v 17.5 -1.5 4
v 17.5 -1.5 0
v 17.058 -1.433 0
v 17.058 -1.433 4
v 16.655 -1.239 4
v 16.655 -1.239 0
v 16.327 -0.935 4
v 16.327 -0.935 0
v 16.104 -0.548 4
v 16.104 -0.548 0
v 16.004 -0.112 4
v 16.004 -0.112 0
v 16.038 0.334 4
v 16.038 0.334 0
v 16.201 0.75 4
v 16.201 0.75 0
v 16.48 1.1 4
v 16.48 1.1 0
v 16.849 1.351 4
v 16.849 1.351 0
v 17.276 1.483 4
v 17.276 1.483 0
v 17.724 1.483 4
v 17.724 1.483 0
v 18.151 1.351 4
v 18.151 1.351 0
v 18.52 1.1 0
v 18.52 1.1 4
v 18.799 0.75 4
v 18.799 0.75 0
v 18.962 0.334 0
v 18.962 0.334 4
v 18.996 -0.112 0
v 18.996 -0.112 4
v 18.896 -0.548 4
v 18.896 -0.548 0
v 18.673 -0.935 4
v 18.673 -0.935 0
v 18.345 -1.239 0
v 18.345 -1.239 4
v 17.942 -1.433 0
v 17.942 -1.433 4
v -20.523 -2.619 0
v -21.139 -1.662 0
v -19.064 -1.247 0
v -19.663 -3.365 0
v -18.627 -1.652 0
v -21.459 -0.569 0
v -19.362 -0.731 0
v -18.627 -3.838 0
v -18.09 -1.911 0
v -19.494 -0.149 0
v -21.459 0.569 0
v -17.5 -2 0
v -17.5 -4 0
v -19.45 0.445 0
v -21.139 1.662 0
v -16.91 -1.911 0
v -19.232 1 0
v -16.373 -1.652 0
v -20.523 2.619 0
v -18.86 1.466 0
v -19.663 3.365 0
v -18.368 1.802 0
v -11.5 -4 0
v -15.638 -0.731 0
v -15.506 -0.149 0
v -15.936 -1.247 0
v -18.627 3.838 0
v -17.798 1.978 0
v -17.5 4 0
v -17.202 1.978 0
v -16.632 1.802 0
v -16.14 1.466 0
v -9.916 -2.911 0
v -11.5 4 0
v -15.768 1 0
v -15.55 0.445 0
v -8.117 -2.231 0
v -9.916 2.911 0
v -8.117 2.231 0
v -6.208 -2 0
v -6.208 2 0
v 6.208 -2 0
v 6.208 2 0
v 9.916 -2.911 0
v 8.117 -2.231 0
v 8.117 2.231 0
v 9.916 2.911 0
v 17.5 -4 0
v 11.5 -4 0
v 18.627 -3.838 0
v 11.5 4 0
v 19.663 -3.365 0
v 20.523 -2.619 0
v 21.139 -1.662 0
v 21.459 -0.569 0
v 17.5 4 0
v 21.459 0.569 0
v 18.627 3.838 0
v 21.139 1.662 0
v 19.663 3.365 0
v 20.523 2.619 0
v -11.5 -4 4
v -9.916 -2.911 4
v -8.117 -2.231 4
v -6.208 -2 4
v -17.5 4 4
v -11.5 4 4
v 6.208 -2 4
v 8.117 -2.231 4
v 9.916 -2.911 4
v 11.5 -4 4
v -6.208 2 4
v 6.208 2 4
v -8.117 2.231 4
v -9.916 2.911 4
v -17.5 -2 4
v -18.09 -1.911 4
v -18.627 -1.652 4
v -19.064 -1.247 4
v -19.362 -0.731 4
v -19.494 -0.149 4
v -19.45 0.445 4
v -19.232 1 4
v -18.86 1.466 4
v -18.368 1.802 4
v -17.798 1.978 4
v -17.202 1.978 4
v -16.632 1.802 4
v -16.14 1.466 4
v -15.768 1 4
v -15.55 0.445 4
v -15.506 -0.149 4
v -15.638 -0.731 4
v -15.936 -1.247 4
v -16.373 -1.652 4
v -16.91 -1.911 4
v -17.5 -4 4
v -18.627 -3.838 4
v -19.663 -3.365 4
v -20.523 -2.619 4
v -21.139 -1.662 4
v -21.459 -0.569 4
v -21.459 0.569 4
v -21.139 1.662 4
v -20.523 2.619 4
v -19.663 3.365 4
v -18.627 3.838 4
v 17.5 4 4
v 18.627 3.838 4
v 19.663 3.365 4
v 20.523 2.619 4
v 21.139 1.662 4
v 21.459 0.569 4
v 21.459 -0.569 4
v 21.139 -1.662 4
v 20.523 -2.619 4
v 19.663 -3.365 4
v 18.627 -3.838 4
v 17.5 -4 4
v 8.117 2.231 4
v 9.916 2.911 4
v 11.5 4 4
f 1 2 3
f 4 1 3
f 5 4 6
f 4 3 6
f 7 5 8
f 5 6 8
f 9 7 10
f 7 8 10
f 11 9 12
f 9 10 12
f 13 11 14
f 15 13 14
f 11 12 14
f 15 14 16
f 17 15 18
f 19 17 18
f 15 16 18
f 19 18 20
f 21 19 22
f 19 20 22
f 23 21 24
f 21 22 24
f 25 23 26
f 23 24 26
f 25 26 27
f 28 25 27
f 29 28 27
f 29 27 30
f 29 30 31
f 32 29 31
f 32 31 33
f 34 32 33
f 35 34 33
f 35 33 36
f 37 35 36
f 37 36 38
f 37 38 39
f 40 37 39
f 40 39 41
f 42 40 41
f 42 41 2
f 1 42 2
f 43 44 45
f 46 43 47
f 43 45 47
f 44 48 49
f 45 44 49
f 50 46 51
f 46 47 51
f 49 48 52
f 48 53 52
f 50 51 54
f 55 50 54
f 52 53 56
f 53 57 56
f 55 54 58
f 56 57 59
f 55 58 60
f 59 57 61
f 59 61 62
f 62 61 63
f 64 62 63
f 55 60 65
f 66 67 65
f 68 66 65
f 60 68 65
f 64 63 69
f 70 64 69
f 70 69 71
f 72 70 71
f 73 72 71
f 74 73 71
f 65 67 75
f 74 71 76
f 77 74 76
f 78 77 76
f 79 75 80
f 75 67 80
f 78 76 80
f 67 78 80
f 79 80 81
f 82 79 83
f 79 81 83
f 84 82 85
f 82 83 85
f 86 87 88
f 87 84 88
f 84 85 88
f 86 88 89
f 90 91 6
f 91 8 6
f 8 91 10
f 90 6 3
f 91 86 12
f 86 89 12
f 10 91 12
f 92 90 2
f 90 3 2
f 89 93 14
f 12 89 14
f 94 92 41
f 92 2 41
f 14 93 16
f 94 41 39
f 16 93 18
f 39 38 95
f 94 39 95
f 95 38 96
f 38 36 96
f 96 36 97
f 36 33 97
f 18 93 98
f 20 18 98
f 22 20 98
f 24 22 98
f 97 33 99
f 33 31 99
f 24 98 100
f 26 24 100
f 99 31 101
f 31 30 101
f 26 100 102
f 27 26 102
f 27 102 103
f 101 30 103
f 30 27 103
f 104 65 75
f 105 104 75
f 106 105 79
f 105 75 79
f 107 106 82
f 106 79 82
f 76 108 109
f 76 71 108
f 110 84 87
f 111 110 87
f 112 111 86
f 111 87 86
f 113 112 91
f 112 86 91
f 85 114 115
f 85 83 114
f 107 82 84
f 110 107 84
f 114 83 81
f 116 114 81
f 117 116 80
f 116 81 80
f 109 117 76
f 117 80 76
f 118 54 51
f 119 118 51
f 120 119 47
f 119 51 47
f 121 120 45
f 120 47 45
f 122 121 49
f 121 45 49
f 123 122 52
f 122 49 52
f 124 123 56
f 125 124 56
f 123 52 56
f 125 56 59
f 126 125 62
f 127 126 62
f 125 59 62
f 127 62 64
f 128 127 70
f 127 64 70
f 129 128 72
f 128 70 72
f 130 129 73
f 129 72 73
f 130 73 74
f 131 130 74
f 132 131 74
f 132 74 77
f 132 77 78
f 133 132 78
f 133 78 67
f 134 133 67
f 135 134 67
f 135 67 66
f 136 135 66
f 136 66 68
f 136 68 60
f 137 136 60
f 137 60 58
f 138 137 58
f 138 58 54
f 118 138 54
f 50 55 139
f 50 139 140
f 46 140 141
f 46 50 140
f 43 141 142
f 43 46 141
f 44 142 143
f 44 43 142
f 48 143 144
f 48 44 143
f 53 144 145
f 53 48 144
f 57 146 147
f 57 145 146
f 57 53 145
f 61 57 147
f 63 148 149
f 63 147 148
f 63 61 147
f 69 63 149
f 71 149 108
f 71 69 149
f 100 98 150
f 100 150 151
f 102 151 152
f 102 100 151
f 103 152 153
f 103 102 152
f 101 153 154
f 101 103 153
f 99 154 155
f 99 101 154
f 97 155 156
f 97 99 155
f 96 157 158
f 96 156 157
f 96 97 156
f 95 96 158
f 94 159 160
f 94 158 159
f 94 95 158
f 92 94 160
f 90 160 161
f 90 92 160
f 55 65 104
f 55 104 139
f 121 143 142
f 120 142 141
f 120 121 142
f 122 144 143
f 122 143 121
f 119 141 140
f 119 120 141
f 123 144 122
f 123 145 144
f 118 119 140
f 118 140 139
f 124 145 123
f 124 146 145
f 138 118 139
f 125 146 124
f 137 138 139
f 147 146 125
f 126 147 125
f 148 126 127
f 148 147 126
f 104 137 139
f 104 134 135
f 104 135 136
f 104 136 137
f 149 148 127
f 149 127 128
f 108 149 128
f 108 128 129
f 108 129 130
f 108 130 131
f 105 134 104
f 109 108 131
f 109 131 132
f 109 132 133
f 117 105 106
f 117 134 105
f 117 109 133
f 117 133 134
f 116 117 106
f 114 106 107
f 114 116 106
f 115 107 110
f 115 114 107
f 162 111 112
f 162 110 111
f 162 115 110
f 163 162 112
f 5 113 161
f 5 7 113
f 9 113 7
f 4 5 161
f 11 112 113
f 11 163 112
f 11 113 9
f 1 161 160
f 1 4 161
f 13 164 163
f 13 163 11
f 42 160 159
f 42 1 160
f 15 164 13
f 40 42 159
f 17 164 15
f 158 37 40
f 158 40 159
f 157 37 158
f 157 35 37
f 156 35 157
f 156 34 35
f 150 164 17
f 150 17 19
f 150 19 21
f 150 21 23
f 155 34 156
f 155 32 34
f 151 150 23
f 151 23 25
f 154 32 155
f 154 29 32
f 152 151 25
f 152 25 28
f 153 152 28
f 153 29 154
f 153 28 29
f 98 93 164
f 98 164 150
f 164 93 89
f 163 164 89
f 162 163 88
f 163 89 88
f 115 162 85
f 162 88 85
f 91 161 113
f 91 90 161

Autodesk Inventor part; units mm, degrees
ref_plane "YZ Plane" through (0, 0, 0) normal (1, 0, 0) x (0, 1, 0)
ref_plane "XZ Plane" through (0, 0, 0) normal (0, 1, 0) x (-1, 0, 0)
ref_plane "XY Plane" through (0, 0, 0) normal (0, 0, 1) x (1, 0, 0)
sketch "Skizze1" plane through (0, 0, 0) normal (0, 0, 1) x (1, 0, 0)
  line L0 (-21.5, 0) -> (21.5, 0) construction
  line L1 (-11.5, -4) -> (-17.5, -4)
  arc A0 (-17.5, 4) -> (-17.5, -4) centre (-17.5, 0) ccw
  line L2 (-17.5, 4) -> (-11.5, 4)
  line L3 (-6.2085, 2) -> (6.2085, 2)
  line L4 (11.5, 4) -> (17.5, 4)
  arc A1 (17.5, -4) -> (17.5, 4) centre (17.5, 0) ccw
  line L5 (17.5, -4) -> (11.5, -4)
  line L6 (-6.2085, -2) -> (6.2085, -2)
  arc A2 (11.5, -4) -> (6.2085, -2) centre (6.2085, -10) ccw
  arc A3 (-6.2085, -2) -> (-11.5, -4) centre (-6.2085, -10) ccw
  arc A4 (6.2085, 2) -> (11.5, 4) centre (6.2085, 10) ccw
  arc A5 (-11.5, 4) -> (-6.2085, 2) centre (-6.2085, 10) ccw
  point P0 (0, 0)
  point P1 (0, 0)
  dimension "d0" = 8
  dimension "d1" = 8
  dimension "d2" = 4
  dimension "d3" = 6
  dimension "d4" = 6
  dimension "d5" = 35
  dimension "d7" = 8
extrude "Extrusion1" add sketch "Skizze1" along normal blind 4
sketch "Skizze2" plane through (0, 0, 4) normal (0, 0, 1) x (1, 0, 0)
  arc A0 (-17.5, 4) -> (-17.5, -4) centre (-17.5, 0) ccw projected
  point P0 (0, 0)
hole "Bohrung1" at (-17.5, 0, 4) direction (0, 0, -1) diameter 4 end through all
sketch "Skizze3" plane through (0, 0, 4) normal (0, 0, 1) x (1, 0, 0)
  arc A0 (17.5, -4) -> (17.5, 4) centre (17.5, 0) ccw projected
  point P0 (0, 0)
hole "Bohrung2" at (17.5, 0, 4) direction (0, 0, -1) diameter 3 end through all
properties part number "Pleuel" material "Stahl, galvanisiert"
